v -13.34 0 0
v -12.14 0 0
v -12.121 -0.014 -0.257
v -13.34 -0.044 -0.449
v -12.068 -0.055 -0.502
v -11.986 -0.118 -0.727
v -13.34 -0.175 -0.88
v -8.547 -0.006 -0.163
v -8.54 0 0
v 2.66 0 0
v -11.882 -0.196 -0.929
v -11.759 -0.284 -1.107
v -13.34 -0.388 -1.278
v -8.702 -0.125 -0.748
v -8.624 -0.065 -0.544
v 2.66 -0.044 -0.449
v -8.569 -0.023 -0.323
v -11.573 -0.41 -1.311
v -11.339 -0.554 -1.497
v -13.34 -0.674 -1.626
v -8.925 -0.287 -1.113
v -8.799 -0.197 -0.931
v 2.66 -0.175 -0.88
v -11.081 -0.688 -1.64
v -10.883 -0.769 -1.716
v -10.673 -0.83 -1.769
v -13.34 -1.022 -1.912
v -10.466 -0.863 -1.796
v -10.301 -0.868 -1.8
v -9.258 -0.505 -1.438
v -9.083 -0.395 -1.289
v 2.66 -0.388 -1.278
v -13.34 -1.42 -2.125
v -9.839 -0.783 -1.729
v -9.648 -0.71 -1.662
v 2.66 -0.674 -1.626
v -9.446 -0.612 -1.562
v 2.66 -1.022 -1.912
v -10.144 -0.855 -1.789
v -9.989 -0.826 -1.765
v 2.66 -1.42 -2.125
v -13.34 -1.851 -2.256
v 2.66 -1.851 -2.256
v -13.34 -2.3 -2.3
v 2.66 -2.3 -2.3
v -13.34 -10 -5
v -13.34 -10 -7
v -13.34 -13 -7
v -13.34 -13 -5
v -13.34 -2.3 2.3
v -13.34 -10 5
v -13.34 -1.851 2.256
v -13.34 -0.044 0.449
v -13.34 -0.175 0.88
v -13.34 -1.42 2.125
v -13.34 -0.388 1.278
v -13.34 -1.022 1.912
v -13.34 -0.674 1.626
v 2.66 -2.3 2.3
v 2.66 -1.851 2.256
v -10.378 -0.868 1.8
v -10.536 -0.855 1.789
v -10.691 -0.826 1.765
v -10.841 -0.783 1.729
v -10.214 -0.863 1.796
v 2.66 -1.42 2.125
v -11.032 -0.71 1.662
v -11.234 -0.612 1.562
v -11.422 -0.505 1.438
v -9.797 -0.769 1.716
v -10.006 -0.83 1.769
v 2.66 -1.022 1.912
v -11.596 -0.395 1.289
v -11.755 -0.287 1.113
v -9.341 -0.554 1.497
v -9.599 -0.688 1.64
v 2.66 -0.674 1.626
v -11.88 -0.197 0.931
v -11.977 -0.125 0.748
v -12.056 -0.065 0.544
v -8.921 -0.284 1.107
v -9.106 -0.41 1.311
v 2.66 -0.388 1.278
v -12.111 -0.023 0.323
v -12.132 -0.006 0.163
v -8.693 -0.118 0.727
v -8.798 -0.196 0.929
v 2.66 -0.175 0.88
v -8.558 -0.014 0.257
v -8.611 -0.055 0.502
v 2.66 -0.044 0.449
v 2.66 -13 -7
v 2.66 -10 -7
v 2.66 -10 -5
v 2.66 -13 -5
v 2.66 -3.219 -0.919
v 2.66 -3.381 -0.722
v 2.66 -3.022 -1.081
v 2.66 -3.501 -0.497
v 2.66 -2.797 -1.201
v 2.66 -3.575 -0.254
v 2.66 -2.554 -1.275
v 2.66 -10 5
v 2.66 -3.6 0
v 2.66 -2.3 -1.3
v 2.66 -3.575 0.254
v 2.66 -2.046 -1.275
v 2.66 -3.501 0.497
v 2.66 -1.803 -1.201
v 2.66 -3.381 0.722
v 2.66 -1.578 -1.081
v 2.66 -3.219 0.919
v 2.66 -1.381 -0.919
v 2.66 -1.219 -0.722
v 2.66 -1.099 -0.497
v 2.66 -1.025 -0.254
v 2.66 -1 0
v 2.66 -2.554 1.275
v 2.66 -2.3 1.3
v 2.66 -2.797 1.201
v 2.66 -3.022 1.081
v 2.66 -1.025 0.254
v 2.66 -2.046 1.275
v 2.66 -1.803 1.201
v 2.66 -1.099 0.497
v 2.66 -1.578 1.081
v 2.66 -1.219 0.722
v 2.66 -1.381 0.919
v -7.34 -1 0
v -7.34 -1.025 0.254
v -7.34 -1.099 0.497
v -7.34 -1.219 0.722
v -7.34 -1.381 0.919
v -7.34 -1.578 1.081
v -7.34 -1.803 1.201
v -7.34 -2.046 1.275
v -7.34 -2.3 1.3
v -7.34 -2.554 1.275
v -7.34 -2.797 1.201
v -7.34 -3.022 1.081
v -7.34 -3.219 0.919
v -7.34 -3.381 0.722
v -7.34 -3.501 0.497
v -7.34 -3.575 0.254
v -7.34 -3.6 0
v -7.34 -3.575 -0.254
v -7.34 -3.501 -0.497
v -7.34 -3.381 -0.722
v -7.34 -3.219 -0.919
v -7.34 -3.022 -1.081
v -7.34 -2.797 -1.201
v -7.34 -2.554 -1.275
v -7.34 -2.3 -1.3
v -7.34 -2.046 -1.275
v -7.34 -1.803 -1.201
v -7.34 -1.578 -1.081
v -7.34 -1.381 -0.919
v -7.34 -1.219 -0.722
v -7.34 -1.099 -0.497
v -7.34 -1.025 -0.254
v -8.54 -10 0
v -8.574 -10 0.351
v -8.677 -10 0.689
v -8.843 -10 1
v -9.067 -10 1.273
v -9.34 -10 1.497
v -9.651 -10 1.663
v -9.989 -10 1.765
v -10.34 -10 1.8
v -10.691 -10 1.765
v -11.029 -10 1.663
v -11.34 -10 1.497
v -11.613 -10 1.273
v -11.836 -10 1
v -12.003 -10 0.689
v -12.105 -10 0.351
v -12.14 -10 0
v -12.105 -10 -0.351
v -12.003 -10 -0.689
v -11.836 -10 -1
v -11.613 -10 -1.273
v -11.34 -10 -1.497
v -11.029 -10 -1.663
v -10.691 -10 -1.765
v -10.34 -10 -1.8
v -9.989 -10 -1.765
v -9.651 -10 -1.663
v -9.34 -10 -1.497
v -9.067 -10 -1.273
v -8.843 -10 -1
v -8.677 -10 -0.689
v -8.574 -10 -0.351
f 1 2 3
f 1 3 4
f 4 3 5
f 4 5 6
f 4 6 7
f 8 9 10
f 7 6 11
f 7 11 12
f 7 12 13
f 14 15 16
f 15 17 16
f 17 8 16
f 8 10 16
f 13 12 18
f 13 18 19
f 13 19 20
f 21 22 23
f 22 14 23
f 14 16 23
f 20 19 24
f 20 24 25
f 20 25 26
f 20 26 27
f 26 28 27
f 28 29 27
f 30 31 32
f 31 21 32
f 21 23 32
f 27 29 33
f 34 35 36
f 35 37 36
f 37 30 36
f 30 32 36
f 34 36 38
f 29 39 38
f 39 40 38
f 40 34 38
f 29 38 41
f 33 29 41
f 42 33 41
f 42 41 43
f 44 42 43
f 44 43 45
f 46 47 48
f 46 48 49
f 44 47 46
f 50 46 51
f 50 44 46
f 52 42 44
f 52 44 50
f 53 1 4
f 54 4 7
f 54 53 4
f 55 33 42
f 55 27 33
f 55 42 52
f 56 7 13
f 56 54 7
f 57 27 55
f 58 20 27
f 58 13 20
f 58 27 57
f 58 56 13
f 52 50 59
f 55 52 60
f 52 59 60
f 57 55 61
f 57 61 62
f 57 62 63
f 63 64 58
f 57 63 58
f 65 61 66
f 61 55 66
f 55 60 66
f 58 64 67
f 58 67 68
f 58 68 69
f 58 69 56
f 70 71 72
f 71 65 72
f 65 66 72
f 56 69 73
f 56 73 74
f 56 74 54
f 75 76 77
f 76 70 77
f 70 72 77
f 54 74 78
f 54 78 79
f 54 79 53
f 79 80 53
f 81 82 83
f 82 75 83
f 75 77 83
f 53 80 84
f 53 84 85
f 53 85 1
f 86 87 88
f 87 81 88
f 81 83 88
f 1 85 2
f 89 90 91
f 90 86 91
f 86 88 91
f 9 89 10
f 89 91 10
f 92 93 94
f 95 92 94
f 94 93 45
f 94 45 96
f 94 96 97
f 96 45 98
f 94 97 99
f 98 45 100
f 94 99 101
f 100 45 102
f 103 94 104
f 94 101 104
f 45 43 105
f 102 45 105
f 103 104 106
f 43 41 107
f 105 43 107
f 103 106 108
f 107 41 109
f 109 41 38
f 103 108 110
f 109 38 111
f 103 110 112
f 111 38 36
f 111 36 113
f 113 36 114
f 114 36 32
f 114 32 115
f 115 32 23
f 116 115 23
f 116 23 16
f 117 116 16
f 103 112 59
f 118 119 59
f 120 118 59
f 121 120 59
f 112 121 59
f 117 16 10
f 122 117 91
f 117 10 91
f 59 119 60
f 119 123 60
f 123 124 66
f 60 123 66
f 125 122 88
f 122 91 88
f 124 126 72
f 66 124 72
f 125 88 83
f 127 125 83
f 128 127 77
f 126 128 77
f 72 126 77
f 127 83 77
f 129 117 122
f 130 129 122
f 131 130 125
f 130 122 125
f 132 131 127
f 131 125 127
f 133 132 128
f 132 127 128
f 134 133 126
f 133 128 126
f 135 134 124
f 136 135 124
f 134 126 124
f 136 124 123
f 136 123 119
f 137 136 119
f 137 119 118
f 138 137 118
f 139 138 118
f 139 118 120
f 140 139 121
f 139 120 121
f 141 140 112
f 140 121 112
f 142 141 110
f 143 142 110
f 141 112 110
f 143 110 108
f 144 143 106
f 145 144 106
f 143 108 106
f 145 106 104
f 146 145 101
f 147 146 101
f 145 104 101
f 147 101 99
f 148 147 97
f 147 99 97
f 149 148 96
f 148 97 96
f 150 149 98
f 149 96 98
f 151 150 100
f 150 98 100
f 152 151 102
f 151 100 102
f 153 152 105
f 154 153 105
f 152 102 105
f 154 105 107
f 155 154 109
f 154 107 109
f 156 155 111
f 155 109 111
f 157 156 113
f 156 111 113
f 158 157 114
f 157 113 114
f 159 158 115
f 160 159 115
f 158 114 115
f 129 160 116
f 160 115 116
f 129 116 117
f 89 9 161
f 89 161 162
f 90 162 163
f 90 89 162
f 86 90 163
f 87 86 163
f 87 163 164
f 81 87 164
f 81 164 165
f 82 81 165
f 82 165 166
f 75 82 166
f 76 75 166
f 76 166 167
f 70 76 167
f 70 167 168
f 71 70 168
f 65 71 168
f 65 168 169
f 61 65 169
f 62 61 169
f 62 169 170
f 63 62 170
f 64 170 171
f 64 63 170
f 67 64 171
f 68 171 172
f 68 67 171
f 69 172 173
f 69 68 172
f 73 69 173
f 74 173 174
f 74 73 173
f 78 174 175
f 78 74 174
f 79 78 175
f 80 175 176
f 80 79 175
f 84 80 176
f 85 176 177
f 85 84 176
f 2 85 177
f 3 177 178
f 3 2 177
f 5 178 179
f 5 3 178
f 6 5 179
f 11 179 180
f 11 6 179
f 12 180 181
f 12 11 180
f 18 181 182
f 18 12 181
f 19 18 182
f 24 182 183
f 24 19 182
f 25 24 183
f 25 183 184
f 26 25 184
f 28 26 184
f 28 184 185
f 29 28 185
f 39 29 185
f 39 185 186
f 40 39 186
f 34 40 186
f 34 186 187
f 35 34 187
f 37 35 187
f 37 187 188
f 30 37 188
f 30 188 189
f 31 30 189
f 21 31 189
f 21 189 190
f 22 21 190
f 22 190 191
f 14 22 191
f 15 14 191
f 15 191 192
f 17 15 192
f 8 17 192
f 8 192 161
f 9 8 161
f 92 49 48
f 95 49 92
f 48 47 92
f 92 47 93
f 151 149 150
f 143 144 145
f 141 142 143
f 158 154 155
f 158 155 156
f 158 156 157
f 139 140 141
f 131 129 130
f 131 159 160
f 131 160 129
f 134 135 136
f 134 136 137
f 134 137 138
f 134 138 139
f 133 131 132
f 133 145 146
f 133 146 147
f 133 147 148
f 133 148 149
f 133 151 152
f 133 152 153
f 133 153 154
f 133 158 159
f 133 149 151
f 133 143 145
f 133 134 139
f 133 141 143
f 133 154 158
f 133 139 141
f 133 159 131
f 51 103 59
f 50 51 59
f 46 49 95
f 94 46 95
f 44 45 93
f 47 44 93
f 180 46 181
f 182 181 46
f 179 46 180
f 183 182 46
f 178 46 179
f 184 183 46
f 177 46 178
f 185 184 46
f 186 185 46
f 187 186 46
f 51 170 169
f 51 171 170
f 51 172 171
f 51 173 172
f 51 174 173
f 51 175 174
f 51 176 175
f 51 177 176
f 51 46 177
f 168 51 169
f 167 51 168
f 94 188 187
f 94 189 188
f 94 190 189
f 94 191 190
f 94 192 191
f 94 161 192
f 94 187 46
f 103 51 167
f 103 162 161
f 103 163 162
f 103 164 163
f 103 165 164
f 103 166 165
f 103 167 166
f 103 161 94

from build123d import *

# Parameters (mm, degrees)
F0_W     = 16
F0_H     = 12
F0_R     = 1.8
F1_DEPTH = 13
F2_W     = 16
F2_H     = 10
F2_R     = 1.8
F3_DEPTH = 3
F5_DEPTH = 16.001
F6_R     = 1.3
F7_DEPTH = 10


# Not quite as in the source:
# - a feature names something its author has since deleted; it is built from what else it names


with BuildPart() as f1:
    # F0 (on Front) → F1 (new body)
    with BuildSketch(Plane.XZ):
        with Locations((-5.3398377105, -1)):
            Rectangle(F0_W, F0_H)
        with Locations((-10.3398377105, 0)):
            Circle(F0_R, mode=Mode.SUBTRACT)
    extrude(amount=F1_DEPTH)

    # F2 (on face) → F3 (cut)
    with BuildSketch(Plane.XZ.offset(13)):
        with Locations((-5.3398377105, 0)):
            Rectangle(F2_W, F2_H)
        with Locations((-10.3398377105, 0)):
            Circle(F2_R, mode=Mode.SUBTRACT)
    extrude(amount=-F3_DEPTH, mode=Mode.SUBTRACT)

    # F4 (on face) → F5 (cut, through all)
    with BuildSketch(Plane.YZ.offset(2.6601622895)):
        with BuildLine():
            ThreePointArc((-2.3, 2.3), (-0.6736544033, 1.6263455967), (0, 0))
            Line((0, 0), (0, 5))
            Line((0, 5), (-10, 5))
            Line((-10, 5), (-2.3, 2.3))
        make_face()
        with BuildLine():
            Line((0, -7), (0, 0))
            ThreePointArc((0, 0), (-0.6736544033, -1.6263455967), (-2.3, -2.3))
            Line((-2.3, -2.3), (-10, -7))
            Line((-10, -7), (0, -7))
        make_face()
    extrude(amount=-F5_DEPTH, mode=Mode.SUBTRACT)

    # F6 (on face) → F7 (cut)
    with BuildSketch(Plane.YZ.offset(2.6601622895)):
        with Locations((-2.3, 0)):
            Circle(F6_R)
    extrude(amount=-F7_DEPTH, mode=Mode.SUBTRACT)


solid = f1.part
